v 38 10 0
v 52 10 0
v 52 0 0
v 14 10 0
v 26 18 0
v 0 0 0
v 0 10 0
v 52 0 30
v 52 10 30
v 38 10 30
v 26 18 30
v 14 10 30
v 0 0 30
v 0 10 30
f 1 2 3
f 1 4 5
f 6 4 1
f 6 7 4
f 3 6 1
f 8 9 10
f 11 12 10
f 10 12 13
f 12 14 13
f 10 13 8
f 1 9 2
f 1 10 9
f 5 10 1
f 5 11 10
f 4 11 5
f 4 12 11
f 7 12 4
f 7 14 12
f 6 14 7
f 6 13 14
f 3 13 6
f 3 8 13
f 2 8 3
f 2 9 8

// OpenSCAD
$fn = 32;

// ----------------------------------------------------------------------
// V guide rail: vrib, 52 mm wide
// ----------------------------------------------------------------------

// --- parameters (mm) ---
rail_w = 52;              // rail width, X
base_t = 10;              // base plate thickness
v_depth = 8;              // V feature depth / height
v_half_w = 12;            // half width of the V at the base face
plate_t = 30;             // rail length, Z (the extrusion height)

profile = [[0, 0], [52, 0], [52, 10], [38, 10], [26, 18], [14, 10], [0, 10]];  // primary outline, 7 points, counter clockwise

// --- the one profile operation ---
linear_extrude(height = plate_t) polygon(points = profile);
